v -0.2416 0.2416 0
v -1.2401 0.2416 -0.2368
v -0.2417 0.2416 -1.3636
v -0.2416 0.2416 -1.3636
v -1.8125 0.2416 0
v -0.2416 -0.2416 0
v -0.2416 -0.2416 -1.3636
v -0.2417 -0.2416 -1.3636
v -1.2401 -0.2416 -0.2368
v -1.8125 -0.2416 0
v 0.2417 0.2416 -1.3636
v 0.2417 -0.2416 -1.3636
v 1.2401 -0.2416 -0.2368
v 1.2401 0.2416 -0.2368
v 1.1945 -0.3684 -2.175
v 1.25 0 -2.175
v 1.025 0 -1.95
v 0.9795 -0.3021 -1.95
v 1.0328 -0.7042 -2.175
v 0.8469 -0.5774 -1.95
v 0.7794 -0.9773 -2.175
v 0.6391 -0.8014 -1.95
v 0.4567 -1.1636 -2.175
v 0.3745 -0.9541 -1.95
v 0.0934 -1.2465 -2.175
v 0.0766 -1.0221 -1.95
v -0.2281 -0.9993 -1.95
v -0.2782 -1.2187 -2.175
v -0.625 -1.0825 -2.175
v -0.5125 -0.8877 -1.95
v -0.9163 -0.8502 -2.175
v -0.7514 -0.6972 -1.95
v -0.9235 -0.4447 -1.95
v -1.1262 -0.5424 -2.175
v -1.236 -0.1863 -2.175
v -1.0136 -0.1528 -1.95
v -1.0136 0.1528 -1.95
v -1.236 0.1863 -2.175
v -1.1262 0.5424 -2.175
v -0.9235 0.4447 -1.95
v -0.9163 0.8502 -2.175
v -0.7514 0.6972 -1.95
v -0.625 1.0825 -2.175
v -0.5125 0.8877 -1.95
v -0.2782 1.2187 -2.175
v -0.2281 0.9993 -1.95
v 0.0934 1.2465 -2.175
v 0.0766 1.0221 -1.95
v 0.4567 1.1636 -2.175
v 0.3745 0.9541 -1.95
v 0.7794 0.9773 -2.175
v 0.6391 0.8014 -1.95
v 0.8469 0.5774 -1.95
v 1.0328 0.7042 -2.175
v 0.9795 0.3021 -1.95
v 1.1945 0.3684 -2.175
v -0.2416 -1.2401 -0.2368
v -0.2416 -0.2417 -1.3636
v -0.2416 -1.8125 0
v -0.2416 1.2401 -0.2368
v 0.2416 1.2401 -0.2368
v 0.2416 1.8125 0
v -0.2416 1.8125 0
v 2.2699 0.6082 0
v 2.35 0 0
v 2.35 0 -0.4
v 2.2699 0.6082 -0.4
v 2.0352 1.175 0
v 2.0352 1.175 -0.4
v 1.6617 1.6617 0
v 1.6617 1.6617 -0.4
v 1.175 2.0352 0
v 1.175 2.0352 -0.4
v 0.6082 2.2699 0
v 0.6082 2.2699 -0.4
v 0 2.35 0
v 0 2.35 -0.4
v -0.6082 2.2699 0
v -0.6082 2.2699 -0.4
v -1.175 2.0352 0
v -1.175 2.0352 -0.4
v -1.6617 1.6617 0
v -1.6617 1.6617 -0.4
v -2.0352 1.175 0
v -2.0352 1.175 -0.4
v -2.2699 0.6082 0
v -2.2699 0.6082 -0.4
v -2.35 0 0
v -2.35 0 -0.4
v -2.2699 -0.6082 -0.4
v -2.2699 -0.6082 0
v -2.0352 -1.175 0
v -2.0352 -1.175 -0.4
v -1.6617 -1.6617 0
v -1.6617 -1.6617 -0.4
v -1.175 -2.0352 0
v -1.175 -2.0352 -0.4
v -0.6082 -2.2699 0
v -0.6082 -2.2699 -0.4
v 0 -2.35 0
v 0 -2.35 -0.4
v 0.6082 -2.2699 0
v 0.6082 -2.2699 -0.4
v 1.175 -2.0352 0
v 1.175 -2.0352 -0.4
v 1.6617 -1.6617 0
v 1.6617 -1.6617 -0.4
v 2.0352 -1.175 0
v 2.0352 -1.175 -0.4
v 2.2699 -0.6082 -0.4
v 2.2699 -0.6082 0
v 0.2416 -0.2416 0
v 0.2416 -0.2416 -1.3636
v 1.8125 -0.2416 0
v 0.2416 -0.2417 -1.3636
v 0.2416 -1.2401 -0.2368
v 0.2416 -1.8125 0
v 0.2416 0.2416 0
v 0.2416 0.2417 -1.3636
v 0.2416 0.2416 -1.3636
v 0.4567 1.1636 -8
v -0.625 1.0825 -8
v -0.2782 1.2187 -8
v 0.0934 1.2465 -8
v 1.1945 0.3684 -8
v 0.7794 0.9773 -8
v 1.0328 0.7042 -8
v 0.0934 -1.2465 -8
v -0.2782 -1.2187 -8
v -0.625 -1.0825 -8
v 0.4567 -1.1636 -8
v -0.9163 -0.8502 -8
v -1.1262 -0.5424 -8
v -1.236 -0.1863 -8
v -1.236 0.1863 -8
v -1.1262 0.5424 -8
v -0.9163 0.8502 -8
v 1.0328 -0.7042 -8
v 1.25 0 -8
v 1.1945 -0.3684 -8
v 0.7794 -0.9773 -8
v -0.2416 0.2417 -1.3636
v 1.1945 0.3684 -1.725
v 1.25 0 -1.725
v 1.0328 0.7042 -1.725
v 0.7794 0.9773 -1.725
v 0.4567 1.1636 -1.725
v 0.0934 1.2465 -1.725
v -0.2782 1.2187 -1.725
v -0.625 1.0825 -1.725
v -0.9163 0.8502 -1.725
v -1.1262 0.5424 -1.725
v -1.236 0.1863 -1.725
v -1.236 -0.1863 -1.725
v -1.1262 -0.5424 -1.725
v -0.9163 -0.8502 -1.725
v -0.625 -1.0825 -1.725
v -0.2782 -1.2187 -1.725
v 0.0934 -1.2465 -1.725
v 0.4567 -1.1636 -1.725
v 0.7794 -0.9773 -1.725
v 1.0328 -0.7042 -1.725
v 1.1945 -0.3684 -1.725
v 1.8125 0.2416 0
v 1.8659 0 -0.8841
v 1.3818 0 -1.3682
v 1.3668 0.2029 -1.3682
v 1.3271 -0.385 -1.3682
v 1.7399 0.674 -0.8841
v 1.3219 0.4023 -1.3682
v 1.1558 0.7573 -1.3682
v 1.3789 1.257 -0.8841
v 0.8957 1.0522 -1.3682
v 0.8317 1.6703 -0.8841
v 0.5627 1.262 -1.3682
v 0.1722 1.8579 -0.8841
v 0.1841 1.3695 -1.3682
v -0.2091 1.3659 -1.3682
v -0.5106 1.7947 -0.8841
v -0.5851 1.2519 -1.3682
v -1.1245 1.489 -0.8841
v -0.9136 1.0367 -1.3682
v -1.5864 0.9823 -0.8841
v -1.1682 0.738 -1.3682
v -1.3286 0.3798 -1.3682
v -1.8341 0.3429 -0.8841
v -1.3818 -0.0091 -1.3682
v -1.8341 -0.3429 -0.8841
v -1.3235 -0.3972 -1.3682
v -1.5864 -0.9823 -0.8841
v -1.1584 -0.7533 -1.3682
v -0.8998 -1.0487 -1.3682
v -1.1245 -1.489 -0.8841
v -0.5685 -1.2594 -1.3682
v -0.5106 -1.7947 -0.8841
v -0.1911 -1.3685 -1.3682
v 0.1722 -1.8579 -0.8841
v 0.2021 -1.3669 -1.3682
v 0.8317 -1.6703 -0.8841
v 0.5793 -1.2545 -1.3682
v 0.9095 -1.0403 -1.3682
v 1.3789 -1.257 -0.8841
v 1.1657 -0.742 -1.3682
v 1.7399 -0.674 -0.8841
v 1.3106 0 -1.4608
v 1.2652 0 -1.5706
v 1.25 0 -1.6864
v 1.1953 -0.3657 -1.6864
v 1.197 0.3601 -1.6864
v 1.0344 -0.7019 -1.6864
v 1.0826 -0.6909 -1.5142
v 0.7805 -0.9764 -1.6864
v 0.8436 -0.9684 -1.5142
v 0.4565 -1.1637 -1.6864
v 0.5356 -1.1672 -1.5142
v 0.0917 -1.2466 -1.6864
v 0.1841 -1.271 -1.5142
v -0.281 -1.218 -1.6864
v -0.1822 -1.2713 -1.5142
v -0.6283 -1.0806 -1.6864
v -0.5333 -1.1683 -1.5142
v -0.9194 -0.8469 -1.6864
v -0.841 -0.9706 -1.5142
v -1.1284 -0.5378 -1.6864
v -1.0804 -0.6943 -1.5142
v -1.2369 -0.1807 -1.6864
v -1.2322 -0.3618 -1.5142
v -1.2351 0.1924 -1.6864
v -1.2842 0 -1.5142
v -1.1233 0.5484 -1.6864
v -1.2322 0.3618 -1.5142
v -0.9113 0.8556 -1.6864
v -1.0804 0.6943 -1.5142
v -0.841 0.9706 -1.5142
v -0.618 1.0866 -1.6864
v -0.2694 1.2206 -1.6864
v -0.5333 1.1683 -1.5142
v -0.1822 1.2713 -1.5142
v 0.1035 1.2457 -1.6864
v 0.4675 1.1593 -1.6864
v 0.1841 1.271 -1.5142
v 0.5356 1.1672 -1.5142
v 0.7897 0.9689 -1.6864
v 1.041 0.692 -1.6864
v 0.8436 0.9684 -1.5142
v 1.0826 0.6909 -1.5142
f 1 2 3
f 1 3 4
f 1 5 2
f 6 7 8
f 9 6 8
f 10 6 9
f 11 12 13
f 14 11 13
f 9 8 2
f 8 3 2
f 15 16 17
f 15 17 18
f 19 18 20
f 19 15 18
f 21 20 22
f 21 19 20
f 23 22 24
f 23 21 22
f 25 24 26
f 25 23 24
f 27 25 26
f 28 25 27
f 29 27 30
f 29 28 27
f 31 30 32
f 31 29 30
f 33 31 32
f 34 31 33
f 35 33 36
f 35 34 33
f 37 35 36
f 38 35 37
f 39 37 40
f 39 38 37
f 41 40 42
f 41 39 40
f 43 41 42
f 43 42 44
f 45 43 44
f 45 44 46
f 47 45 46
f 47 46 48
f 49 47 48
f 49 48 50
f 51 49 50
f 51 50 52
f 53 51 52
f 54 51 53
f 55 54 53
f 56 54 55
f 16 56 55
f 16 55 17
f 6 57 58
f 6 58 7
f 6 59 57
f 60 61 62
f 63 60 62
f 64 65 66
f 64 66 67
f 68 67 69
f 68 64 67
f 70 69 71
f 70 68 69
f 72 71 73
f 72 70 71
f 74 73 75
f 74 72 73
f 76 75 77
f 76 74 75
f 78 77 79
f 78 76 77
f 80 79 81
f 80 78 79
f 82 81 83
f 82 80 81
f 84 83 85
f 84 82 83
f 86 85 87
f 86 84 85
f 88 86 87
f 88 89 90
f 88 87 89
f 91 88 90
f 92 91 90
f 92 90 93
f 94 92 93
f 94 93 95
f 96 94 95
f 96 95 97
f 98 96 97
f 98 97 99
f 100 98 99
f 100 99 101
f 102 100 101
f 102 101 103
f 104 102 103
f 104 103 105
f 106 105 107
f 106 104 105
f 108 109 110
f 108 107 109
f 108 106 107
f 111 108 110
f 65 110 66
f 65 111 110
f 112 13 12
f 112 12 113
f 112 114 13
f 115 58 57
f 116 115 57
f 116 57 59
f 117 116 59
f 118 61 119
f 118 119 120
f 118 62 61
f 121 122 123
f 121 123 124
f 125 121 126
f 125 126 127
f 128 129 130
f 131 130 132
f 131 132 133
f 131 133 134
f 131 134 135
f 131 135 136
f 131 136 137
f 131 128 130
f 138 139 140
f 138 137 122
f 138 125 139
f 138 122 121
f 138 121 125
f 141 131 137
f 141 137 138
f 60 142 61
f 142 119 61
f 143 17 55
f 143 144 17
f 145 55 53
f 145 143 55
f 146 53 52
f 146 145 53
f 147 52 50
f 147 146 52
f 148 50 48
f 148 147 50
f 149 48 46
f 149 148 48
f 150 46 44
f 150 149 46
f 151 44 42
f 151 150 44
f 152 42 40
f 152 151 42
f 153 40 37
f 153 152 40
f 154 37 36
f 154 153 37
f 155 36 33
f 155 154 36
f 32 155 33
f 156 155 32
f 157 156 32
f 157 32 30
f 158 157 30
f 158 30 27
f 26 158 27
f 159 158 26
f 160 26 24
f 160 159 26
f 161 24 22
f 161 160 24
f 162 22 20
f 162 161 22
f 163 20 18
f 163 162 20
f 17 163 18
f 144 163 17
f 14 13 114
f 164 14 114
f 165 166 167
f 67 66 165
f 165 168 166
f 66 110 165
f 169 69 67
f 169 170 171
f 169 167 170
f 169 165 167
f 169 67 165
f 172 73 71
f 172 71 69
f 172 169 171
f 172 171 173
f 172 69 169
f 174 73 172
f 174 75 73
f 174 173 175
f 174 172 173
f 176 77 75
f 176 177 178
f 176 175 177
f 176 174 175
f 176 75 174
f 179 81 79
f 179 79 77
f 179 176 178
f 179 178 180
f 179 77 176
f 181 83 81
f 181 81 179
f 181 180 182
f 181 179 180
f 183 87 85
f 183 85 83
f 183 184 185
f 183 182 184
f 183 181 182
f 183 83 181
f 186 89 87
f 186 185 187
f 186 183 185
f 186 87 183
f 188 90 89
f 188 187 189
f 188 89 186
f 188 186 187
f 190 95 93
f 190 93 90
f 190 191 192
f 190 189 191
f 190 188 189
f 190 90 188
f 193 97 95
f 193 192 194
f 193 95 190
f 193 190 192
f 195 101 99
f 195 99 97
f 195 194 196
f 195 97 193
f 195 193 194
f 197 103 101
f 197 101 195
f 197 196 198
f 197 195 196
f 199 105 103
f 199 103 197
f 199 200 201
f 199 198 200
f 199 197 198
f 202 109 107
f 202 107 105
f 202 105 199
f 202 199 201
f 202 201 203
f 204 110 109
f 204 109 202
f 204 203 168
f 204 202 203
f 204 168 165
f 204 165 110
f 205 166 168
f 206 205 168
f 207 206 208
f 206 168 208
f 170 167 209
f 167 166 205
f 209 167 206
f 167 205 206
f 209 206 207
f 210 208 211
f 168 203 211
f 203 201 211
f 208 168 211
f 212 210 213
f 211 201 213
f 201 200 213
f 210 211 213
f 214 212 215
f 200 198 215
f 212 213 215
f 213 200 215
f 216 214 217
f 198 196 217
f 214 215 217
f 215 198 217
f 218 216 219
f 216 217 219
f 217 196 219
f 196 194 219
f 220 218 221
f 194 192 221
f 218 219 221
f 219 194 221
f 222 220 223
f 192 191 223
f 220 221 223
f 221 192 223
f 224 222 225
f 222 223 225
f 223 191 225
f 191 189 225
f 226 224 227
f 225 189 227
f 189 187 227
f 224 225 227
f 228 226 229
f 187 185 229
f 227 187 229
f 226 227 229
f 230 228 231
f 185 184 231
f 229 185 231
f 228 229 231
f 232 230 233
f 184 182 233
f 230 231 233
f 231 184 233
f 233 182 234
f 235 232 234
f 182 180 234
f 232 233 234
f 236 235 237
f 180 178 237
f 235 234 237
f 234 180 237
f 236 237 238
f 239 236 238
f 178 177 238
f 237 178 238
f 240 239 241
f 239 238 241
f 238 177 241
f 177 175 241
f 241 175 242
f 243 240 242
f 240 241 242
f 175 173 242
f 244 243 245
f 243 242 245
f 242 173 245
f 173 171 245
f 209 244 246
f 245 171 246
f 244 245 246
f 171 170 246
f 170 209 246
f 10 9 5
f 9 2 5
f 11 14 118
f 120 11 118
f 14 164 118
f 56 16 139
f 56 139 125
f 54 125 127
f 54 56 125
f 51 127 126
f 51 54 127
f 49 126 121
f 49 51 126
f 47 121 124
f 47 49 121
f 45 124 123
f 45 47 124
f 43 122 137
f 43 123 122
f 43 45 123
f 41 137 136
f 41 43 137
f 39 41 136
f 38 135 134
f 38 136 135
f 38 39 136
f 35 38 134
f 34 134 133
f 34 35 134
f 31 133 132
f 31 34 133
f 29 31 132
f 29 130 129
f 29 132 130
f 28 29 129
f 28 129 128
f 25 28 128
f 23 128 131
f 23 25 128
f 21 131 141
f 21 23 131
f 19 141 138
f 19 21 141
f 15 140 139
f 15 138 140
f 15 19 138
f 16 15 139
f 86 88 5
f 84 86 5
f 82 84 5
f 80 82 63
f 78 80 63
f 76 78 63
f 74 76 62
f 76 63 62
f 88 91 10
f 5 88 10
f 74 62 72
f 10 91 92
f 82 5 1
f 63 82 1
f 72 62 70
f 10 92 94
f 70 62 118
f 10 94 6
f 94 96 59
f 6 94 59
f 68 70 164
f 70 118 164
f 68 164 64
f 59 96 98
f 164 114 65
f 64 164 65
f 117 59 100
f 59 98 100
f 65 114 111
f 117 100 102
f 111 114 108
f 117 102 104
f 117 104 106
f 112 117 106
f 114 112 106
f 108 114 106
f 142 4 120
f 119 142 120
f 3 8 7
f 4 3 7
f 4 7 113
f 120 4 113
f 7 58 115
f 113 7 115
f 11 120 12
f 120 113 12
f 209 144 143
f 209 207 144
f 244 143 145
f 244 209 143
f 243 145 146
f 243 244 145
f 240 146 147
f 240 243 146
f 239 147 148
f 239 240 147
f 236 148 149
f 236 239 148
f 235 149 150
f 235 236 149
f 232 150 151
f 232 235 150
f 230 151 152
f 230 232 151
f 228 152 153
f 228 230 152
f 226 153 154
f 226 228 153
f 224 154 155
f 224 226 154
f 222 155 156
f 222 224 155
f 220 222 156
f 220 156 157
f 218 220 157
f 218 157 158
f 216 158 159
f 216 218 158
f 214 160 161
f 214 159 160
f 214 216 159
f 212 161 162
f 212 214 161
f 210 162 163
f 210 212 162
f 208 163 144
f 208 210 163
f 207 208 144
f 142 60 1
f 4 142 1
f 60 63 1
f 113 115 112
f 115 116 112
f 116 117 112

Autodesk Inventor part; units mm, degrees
ref_plane "YZ Plane" through (0, 0, 0) normal (1, 0, 0) x (0, 1, 0)
sketch "Esquisse1" plane through (0, 0, 0) normal (0, 1, 0) x (-1, 0, 0)
  point P0 (0, 0)
sketch "Esquisse2" plane through (0, 0, 0) normal (0, 0, 1) x (1, 0, 0)
  point P0 (0, 0)
sketch "Esquisse3" plane through (0, 0, 0) normal (0, 0, 1) x (1, 0, 0)
  point P0 (0, 0)
sketch "Esquisse4" plane through (0, 0, 0) normal (0, 1, 0) x (-1, 0, 0)
  line L0 (-2.35, 0) -> (0, 0)
  line L1 (-2.35, -0.4) -> (-2.35, 0)
  line L2 (-1.25, -1.5) -> (-2.35, -0.4)
  line L3 (-1.25, -1.725) -> (-1.25, -1.5)
  line L4 (-1.025, -1.95) -> (-1.25, -1.725)
  line L5 (-1.25, -2.175) -> (-1.025, -1.95)
  line L6 (-1.25, -8) -> (-1.25, -2.175)
  line L7 (0, 0) -> (0, -8)
  line L8 (0, 3.3392) -> (0, -10.7) construction
  line L9 (0, 3.3392) -> (0, -10.7)
  line L10 (0, -13.5078) -> (0, 6.1471) projected
  line L11 (-1.25, -8) -> (0, -8)
  line L12 (0.47, 0) -> (-2.82, 0) projected
  dimension "d3" = 2.35
  dimension "d5" = 0.225
  dimension "d7" = 0.225
  dimension "d9" = 0.225
  dimension "d11" = 1.5
  dimension "d13" = 135
  dimension "d17" = 1.025
  dimension "d19" = 0
  dimension "d51" = 1.25
  dimension "d52" = 8
revolve "Révolution1" add sketch "Esquisse4" angle 360 about axis through (0, 0, 3.3392) along (0, 0, -1)
sketch "Esquisse5" plane through (0, 0, 0) normal (0, 1, 0) x (-1, 0, 0)
  line L0 (-1.45, 0) -> (0, 0)
  line L1 (-0.2417, -1.3636) -> (-1.45, 0)
  line L2 (0, -1.3636) -> (-0.2417, -1.3636)
  line L3 (0, 0) -> (0, -1.3636)
  line L4 (-1.25, -1.5) -> (1.25, -1.5) construction
  line L5 (-2.35, 0) -> (2.35, 0) projected
  line L6 (0, -1.8) -> (0, 0.3) projected
  dimension "d22" = 1.45
  dimension "d24" = 0.2417
  dimension "d26" = 1.3636
extrude "Extrusion1" cut sketch "Esquisse5" along normal mid plane 0.4833
pattern_circular "RéseauPolaire1" count 4 over 360 about axis through (0, 0, 0) along (0, 0, 1) of "Extrusion1"
sketch "Esquisse7" plane through (0, 0, 0) normal (0, 1, 0) x (-1, 0, 0)
  line L0 (0, -0.75) -> (-1.8125, 0)
  line L1 (0, 0) -> (0, -0.75)
  line L2 (-1.8125, 0) -> (0, 0)
  line L3 (-1.25, -1.5) -> (1.25, -1.5) construction
  line L4 (0, -1.8) -> (0, 0.3) projected
  line L5 (-2.35, 0) -> (2.35, 0) projected
  dimension "d33" = 1.8125
  dimension "d35" = 0.75
extrude "Extrusion2" cut sketch "Esquisse7" along normal mid plane 0.4833
pattern_circular "RéseauPolaire2" count 4 over 360 about axis through (0, 0, 0) along (0, 0, 1) of "Extrusion2"
fillet "Congé1" radius 0.45 1 edges at (-1.25, 0, -1.5)
thread "Filetage1" size "M2.5x0.45" class "6g" standard "ISO Metric profile" full length
ref_plane "MSC_PF1" through (0, 0, 0) normal (1, 0, 0) x (0, 1, 0)
ref_plane "MSC_PT1" through (0, 0, 0) normal (0, 0, -1) x (-1, 0, 0)
equation "\"d3\" = 0.5 * Dh"
equation "\"d5\" = msp_x"
equation "\"d7\" = ParA"
equation "\"d9\" = msp_x"
equation "\"d11\" = ParK"
equation "\"d17\" = 0.5 * msp_mdtds"
equation "\"d51\" = 0.5 * NND"
equation "\"d52\" = NLG"
equation "\"d22\" = 0.5 * M"
equation "\"d24\" = 0.0833333 * M"
equation "\"d26\" = 0.909091 * ParK"
equation "\"d27\" = 0.166667 * M"
equation "\"d33\" = 0.625 * M"
equation "\"d35\" = 0.5 * ParK"
equation "\"d36\" = 0.166667 * M"
equation "\"d41\" = 2 * msp_x"
equation "\"PTC\" = 0.45"
equation "\"NLG\" = 8"
equation "\"ParK\" = 1.5"
equation "\"NND\" = 2.5"
equation "\"M\" = 2.9"
equation "\"msp_mdtds\" = NND - PTC"
equation "\"Dh\" = 4.7"
equation "\"msp_x\" = 0.5 * PTC"
equation "\"ParA\" = 0.5 * PTC"
equation "\"r\" = 0.6"
equation "\"THREADDIA\" = NND"
equation "\"TEMPLATE\" = 1.2345"
properties part number "NF EN ISO 7046-2 H - M2.5x8 - 8.8 - H1" material "Acier inoxydable 440C"
